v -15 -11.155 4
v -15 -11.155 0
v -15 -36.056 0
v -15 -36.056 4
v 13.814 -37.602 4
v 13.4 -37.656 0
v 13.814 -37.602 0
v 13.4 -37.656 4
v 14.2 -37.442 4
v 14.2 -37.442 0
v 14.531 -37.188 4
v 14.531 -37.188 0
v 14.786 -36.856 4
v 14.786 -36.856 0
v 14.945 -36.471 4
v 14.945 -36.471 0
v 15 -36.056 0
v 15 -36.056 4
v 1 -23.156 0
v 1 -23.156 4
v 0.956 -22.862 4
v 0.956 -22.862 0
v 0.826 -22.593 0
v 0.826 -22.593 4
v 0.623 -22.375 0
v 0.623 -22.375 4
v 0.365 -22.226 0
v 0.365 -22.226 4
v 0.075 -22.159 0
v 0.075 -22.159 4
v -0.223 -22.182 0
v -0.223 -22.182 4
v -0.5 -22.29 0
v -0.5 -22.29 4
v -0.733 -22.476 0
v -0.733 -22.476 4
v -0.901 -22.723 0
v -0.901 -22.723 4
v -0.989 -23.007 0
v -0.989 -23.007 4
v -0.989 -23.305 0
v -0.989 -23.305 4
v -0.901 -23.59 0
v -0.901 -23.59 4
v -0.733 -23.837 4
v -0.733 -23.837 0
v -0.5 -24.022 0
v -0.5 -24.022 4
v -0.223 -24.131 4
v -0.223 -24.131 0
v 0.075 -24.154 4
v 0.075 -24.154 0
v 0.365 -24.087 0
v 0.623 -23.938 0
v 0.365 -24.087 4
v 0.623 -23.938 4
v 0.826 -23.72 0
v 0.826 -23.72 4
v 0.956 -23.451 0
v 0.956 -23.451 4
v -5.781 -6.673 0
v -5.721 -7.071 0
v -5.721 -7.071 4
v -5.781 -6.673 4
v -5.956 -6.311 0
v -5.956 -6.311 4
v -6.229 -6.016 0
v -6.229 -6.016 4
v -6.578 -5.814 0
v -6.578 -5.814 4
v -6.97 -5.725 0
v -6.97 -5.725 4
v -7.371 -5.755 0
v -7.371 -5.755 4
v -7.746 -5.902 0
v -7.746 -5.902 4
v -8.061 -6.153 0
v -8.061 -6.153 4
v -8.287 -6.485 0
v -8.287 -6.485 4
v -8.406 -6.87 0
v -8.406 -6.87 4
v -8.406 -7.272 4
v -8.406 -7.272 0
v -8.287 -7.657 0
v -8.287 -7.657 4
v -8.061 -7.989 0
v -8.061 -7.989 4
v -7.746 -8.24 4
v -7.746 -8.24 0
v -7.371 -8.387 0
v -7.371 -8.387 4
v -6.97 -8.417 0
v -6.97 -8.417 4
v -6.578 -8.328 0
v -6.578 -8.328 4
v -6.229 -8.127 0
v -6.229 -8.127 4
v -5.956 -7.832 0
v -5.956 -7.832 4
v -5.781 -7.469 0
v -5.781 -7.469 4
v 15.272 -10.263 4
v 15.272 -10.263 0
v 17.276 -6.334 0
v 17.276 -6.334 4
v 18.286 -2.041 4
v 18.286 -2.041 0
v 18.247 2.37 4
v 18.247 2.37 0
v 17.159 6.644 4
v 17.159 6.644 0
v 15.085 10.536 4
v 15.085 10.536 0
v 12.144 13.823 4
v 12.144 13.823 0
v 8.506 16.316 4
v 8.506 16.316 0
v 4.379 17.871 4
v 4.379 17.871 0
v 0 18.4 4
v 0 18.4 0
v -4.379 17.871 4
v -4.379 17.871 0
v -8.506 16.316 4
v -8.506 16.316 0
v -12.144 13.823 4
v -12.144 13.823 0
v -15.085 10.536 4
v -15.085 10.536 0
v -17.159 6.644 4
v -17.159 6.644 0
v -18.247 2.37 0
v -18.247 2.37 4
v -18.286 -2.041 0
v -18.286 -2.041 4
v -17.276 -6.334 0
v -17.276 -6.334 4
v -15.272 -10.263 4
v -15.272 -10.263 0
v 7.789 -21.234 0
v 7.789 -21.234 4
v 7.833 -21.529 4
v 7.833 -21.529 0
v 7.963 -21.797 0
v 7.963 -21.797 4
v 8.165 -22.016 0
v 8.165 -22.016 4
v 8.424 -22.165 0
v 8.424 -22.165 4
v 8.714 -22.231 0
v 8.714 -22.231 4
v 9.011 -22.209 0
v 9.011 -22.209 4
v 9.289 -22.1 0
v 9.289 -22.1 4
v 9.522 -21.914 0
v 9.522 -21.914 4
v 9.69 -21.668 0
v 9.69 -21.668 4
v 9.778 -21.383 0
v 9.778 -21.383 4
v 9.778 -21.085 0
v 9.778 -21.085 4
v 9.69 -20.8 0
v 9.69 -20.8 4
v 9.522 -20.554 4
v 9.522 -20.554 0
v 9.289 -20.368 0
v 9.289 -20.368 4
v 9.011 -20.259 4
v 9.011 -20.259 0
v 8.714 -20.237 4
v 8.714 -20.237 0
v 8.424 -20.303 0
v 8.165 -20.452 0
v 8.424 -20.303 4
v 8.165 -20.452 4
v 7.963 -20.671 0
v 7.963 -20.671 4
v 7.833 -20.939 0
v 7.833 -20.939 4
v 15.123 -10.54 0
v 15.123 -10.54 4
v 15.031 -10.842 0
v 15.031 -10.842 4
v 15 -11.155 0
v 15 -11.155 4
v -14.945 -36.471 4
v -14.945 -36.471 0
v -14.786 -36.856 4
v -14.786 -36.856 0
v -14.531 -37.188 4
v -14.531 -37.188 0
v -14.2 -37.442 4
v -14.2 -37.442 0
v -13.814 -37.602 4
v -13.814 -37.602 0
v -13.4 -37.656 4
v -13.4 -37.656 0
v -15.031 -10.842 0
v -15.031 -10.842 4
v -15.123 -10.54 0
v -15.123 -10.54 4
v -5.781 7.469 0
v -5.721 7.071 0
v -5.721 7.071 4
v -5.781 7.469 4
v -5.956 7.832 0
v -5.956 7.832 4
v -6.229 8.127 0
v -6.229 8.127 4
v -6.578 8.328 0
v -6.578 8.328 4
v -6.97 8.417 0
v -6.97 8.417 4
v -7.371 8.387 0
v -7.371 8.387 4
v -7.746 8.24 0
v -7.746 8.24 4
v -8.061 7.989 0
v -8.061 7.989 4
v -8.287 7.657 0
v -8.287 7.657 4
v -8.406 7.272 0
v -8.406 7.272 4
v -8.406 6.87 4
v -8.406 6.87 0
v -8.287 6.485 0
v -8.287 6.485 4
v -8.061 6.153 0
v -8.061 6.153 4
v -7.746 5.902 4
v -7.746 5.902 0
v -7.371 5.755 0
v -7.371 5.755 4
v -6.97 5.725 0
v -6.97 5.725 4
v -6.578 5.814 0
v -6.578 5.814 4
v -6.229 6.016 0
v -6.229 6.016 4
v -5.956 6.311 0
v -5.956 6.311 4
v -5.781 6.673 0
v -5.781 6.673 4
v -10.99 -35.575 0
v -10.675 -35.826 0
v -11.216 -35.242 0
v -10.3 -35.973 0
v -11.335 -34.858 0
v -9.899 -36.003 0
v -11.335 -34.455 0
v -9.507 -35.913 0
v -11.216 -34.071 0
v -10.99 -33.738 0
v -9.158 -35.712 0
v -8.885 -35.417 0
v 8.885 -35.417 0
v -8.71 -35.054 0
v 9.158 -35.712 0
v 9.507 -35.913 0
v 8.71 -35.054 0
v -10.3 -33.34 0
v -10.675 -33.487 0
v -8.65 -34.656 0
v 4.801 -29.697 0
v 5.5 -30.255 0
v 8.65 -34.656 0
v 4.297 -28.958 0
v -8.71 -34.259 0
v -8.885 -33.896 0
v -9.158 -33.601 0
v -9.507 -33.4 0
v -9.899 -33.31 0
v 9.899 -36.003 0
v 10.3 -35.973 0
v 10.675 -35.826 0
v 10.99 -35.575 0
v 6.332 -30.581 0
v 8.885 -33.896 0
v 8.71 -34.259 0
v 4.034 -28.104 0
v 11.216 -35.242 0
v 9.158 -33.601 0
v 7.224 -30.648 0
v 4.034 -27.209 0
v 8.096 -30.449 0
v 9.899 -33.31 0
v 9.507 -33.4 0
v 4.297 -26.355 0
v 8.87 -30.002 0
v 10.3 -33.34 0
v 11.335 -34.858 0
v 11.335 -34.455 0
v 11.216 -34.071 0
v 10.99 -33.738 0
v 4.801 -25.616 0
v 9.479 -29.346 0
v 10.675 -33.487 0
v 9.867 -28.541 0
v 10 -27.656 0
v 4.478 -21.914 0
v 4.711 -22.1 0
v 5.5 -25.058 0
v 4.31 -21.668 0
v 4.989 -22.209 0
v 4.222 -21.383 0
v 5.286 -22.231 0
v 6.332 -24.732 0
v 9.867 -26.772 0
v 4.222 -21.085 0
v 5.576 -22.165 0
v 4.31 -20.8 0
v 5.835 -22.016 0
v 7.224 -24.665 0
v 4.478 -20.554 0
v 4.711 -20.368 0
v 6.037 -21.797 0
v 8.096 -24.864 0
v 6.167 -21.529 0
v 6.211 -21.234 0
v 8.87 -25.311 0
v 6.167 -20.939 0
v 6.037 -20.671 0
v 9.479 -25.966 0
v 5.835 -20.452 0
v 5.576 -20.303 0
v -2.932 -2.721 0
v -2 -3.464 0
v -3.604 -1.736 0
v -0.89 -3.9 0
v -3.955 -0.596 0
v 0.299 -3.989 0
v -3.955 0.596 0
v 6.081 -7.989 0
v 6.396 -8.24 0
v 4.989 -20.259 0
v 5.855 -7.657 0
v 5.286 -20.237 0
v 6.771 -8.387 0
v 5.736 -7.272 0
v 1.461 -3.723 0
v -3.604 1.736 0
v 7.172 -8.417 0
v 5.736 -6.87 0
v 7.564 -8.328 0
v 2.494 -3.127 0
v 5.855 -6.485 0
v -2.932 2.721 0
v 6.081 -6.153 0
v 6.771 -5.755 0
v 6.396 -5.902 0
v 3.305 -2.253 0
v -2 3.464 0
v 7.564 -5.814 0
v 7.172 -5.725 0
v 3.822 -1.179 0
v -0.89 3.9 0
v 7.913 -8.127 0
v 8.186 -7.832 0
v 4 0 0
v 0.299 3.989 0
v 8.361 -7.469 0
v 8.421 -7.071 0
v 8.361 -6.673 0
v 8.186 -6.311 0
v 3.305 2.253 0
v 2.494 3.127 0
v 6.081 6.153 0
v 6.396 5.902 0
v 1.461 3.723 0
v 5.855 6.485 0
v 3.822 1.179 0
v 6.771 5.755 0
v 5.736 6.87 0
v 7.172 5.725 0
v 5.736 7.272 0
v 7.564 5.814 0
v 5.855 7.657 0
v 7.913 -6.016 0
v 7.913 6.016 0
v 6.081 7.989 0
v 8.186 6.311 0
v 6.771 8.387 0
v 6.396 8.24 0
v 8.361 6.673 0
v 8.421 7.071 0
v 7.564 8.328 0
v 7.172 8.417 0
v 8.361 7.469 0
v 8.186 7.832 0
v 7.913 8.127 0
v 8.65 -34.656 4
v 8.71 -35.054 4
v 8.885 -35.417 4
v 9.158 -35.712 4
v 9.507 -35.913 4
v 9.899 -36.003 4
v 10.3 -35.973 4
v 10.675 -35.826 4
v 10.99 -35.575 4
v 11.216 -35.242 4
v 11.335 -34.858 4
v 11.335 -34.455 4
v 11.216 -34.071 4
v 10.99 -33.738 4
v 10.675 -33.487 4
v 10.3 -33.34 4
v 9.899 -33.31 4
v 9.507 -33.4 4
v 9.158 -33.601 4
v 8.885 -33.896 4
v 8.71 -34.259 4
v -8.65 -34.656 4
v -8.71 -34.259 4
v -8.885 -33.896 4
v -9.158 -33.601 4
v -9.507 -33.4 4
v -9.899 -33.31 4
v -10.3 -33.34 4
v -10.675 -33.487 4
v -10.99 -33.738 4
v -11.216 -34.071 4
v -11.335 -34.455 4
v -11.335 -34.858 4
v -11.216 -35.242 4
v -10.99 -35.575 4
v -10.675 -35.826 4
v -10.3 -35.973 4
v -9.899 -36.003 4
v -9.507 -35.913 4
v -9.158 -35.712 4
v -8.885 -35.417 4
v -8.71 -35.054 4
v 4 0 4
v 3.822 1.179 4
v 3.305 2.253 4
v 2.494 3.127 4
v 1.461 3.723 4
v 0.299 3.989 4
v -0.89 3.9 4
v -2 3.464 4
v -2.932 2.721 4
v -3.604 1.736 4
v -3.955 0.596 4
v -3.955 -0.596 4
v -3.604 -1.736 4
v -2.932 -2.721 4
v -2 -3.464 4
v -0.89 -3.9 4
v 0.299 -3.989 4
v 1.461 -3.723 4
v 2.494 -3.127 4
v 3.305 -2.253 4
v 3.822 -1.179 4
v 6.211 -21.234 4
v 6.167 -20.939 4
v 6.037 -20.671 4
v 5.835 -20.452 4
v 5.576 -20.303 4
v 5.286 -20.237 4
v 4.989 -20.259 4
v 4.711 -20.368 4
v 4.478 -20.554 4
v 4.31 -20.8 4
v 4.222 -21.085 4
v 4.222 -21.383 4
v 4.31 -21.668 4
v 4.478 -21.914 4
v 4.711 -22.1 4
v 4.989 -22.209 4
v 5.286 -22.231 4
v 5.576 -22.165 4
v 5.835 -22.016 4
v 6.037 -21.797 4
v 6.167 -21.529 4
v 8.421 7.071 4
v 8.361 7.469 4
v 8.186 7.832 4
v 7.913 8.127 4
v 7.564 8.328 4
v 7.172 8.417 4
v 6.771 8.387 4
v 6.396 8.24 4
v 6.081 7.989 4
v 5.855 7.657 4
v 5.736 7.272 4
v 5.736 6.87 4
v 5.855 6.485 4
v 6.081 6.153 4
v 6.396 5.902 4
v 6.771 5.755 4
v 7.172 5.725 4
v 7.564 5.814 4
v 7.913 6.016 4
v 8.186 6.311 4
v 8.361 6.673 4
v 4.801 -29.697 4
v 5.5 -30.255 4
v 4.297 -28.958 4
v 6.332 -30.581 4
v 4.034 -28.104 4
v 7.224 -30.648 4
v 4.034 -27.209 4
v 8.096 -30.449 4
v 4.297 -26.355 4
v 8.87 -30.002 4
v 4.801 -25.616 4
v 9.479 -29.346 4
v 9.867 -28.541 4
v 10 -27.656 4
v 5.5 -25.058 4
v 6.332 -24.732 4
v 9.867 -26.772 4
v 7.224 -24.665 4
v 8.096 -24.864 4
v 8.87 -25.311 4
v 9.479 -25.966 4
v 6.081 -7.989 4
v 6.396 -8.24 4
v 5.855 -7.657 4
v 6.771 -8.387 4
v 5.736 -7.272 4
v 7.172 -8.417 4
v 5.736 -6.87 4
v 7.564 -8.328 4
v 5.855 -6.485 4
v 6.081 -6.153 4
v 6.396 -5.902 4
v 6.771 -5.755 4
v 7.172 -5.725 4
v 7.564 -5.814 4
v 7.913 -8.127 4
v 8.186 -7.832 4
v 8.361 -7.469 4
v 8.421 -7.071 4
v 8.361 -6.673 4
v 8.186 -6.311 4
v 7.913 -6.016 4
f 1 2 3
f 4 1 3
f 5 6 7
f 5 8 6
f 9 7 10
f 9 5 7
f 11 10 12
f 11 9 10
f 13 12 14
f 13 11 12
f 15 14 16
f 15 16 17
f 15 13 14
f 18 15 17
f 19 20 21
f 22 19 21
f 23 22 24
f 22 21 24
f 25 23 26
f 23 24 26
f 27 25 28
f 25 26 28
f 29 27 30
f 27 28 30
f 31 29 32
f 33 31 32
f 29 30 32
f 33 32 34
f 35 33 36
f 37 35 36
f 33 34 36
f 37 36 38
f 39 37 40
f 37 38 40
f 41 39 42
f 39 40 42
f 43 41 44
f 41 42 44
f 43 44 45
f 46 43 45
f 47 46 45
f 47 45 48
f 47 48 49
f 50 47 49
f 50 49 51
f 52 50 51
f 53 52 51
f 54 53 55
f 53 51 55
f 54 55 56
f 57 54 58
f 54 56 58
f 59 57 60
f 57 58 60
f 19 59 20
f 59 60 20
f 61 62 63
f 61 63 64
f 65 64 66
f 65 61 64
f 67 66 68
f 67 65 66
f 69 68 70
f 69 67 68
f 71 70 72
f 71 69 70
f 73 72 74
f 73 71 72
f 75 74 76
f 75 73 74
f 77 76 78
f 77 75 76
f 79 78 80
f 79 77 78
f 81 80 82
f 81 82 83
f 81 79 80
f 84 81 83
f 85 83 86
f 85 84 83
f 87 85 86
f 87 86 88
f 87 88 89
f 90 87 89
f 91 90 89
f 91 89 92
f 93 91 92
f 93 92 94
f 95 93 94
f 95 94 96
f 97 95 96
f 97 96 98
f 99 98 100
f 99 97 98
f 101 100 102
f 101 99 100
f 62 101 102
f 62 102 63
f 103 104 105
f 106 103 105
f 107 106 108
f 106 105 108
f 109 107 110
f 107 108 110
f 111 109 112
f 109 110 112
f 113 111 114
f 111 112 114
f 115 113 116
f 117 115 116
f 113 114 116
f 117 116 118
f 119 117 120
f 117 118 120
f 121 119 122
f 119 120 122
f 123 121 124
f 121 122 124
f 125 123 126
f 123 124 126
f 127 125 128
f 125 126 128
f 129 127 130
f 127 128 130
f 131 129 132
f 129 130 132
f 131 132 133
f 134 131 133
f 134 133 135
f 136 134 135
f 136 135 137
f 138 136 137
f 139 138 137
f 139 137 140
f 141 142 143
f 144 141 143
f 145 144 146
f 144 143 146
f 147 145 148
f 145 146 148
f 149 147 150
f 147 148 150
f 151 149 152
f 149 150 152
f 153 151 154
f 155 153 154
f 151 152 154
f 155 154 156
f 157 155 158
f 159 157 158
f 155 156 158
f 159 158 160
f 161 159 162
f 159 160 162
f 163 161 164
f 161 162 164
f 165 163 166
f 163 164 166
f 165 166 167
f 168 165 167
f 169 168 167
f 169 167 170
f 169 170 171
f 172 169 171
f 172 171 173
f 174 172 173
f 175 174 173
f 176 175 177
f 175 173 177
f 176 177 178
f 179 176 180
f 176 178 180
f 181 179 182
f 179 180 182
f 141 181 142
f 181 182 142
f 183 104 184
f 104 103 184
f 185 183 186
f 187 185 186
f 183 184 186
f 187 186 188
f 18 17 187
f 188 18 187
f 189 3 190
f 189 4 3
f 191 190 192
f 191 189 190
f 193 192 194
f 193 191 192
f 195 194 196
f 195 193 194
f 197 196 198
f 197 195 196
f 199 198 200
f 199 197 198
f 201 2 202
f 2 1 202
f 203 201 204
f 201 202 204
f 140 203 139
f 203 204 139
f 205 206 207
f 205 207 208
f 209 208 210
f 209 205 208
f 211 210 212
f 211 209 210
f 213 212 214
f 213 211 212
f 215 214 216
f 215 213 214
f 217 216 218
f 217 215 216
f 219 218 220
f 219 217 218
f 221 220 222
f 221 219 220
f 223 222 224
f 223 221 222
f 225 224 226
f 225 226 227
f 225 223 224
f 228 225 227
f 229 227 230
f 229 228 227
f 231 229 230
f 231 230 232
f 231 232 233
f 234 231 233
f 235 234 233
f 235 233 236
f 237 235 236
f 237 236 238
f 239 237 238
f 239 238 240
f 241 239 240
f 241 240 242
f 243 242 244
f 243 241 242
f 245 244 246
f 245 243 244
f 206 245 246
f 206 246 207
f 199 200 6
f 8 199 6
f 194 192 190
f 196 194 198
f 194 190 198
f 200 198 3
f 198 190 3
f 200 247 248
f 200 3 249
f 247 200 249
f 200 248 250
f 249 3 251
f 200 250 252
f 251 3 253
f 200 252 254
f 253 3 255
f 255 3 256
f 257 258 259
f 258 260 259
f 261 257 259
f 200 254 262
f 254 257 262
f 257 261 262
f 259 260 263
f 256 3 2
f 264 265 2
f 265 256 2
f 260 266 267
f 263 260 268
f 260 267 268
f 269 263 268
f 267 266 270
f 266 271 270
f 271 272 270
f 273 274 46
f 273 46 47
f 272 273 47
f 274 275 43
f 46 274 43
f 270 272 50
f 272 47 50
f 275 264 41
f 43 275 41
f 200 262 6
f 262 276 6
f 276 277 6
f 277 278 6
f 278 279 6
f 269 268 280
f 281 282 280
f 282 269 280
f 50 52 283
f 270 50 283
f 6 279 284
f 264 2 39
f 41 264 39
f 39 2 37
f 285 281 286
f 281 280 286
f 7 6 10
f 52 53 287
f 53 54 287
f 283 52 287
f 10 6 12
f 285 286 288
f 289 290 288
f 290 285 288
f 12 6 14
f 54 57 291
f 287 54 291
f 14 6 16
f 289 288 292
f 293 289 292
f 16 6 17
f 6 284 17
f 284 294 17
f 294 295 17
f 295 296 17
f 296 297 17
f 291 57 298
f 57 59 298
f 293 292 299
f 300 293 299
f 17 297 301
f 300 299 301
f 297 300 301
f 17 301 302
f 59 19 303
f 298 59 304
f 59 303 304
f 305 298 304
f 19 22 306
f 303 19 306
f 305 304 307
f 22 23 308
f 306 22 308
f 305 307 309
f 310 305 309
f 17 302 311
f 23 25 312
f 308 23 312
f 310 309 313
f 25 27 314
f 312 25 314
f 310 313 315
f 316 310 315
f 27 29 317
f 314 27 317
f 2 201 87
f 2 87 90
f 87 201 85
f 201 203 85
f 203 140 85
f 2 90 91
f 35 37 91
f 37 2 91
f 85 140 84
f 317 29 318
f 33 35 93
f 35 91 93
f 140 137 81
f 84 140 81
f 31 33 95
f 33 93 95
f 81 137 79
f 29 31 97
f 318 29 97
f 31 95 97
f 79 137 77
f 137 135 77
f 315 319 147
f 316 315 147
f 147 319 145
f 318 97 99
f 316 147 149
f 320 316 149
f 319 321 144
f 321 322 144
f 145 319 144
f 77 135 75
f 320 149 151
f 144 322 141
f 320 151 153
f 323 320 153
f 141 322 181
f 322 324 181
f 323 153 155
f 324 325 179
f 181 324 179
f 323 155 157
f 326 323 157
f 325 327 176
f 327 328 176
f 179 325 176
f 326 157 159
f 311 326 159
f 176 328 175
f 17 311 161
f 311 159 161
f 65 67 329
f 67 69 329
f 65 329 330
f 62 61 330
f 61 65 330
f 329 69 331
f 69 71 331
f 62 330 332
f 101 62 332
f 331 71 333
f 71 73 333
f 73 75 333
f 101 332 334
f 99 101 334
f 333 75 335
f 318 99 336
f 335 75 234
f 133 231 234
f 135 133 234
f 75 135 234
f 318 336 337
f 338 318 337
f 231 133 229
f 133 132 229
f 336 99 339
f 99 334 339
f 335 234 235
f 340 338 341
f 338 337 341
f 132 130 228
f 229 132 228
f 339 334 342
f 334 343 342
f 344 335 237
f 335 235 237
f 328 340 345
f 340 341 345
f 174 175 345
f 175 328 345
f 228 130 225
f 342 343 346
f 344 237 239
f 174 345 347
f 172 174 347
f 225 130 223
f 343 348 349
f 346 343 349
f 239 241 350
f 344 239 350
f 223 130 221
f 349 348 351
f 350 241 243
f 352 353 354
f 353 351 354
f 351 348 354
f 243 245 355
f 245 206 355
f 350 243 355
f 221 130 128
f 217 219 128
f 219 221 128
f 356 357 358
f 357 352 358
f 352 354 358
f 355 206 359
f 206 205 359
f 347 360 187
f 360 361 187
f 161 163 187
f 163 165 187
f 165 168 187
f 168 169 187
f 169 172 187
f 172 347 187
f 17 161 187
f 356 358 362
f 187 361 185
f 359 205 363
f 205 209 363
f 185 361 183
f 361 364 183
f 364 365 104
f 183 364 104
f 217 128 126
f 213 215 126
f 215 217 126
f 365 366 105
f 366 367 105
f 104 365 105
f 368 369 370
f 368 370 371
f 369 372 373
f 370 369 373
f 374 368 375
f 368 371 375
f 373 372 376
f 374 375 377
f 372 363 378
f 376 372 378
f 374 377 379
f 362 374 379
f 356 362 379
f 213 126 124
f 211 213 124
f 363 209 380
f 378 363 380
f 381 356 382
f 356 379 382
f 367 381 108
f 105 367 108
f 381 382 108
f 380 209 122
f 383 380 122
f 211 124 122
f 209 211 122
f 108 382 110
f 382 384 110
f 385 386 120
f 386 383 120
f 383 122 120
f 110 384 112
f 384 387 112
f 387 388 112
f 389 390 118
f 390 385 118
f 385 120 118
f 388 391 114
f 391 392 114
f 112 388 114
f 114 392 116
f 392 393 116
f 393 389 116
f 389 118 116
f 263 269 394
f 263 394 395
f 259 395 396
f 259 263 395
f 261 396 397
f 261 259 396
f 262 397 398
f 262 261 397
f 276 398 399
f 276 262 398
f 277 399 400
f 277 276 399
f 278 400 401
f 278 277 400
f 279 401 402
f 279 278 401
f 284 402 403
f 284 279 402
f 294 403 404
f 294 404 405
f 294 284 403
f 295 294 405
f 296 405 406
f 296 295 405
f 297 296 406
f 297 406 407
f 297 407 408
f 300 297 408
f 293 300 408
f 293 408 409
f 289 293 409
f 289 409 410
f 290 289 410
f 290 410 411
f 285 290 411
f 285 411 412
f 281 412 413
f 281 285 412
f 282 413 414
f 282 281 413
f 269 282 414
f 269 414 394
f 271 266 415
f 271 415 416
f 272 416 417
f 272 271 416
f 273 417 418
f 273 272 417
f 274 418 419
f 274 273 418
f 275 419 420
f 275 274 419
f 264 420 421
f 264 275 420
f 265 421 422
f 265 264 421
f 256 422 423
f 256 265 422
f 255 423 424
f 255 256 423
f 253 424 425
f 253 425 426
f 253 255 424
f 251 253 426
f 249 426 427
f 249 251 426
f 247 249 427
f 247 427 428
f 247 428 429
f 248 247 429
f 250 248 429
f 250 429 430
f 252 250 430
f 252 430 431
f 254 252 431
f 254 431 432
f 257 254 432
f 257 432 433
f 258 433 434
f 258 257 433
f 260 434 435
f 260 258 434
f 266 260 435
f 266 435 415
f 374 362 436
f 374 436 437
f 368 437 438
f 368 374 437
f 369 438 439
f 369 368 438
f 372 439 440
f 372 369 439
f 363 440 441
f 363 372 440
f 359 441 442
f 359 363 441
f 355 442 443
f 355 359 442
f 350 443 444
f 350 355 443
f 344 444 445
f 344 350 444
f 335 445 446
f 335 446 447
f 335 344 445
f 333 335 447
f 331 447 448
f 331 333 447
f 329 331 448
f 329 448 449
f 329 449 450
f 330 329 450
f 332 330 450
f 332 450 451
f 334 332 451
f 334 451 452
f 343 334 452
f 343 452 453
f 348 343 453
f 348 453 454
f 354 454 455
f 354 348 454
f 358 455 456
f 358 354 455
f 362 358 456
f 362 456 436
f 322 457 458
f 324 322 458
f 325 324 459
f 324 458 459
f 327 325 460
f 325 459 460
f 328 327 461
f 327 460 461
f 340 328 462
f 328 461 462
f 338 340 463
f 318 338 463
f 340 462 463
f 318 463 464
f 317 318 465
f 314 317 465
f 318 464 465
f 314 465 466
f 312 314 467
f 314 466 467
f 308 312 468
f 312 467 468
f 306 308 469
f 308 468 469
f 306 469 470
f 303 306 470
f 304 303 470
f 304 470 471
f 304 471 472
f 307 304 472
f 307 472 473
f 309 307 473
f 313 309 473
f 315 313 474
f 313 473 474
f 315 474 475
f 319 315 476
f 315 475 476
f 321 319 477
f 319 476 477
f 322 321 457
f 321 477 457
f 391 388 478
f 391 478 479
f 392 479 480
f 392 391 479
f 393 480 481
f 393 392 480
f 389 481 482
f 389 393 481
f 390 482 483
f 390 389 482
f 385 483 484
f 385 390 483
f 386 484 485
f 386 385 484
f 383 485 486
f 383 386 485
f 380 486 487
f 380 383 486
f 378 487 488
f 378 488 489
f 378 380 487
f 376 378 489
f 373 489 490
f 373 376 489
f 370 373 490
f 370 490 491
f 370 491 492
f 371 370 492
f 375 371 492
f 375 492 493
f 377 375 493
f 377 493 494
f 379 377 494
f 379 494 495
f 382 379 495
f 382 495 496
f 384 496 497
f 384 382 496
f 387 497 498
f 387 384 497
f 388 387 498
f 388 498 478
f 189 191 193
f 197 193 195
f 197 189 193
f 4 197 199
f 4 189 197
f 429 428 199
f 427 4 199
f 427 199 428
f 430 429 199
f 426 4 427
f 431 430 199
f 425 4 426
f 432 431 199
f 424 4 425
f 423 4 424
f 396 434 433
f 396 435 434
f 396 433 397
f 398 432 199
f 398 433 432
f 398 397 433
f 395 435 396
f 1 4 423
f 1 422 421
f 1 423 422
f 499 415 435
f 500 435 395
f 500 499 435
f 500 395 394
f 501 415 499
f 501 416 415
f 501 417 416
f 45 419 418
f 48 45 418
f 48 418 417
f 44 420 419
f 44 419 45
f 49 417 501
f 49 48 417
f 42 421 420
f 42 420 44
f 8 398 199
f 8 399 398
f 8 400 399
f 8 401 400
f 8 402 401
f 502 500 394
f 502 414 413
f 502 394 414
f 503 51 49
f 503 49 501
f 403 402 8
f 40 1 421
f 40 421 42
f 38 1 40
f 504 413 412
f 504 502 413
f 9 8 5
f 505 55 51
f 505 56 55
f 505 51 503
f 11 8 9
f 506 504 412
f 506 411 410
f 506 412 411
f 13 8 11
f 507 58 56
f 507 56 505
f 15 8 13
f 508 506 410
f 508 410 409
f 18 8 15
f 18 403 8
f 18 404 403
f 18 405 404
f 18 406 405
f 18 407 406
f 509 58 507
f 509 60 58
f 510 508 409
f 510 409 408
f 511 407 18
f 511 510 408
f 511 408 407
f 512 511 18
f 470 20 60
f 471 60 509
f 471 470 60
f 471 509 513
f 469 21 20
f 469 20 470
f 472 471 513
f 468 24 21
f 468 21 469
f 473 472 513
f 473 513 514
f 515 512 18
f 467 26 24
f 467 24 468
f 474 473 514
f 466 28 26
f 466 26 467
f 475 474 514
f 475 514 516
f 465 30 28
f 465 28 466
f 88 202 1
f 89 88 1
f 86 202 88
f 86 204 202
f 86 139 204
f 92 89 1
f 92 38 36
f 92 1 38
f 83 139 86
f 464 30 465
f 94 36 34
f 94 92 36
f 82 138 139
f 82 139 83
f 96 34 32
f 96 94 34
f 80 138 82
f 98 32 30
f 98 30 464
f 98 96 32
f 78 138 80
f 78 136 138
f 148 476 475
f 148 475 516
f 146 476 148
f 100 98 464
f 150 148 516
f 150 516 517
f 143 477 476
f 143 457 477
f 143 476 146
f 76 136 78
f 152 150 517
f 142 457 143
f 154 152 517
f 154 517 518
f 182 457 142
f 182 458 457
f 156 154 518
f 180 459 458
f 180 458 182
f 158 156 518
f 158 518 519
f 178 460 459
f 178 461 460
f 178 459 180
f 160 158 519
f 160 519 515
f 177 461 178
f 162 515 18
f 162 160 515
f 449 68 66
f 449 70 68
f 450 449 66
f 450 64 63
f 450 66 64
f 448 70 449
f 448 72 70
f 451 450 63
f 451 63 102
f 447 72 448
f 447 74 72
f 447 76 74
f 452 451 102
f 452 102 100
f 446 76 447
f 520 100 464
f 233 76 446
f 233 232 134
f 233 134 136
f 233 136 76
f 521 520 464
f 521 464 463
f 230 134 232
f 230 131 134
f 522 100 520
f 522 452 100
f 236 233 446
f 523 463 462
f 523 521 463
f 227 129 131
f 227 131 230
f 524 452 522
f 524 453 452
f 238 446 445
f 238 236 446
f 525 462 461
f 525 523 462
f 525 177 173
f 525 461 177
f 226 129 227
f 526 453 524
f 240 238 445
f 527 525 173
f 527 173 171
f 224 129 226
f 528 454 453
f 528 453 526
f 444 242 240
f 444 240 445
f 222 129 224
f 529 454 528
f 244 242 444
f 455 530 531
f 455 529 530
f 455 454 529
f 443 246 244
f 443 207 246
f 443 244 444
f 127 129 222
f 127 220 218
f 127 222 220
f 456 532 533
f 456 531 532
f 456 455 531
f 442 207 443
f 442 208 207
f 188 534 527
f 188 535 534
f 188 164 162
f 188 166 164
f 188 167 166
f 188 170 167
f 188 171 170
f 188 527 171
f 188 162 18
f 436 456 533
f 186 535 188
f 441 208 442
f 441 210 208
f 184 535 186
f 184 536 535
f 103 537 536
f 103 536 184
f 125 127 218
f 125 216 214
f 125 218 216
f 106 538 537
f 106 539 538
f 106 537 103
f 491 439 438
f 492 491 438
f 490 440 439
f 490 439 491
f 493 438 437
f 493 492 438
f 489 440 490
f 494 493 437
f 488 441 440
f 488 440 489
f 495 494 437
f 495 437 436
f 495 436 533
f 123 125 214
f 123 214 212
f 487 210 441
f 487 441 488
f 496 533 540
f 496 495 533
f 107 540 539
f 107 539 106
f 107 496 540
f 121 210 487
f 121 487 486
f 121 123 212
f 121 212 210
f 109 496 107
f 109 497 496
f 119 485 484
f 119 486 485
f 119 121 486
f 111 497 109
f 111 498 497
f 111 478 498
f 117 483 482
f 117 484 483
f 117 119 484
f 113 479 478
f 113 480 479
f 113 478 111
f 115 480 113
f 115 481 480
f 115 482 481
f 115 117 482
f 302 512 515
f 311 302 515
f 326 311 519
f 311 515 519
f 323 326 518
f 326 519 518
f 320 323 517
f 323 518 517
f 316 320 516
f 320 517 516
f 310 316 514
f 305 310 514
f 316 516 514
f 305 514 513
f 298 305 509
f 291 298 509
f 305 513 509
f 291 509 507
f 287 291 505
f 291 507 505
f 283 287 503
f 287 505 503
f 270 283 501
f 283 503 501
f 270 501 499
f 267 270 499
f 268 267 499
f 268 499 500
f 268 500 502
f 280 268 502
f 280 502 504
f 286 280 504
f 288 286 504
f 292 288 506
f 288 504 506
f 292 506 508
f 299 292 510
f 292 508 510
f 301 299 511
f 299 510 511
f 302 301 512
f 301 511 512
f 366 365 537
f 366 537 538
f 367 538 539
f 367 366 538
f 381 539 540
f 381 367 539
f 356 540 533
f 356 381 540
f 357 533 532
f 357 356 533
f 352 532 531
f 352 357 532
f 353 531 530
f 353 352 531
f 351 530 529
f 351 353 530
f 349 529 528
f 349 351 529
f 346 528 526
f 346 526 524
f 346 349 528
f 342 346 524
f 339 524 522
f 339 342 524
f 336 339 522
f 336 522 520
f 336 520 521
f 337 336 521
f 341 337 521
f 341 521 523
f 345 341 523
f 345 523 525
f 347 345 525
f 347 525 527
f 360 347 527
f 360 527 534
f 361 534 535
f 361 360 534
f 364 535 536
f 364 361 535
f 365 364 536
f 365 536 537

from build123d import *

# Parameters (mm, degrees)
CROQUIS1_R              = 1.35
CROQUIS1_R_2            = 4
SALIENTE_EXTRUIR1_DEPTH = 4
CROQUIS2_R              = 3
CROQUIS2_R_2            = 1
CORTAR_EXTRUIR1_DEPTH   = 4
REDONDEO1_R             = 1.6
CROQUIS3_R              = 1
CORTAR_EXTRUIR2_DEPTH   = 4


with BuildPart() as part:
    # Croquis1 → Saliente-Extruir1 (new body)
    with BuildSketch(Plane.XY):
        with BuildLine():
            Line((-15, -10.656453444), (-15, -37.656453444))
            Line((-15, -37.656453444), (15, -37.656453444))
            Line((15, -37.656453444), (15, -10.656453444))
            ThreePointArc((15, -10.656453444), (0, 18.4), (-15, -10.656453444))
        make_face()
        with Locations((-7.071067812, -7.071067812)):
            Circle(CROQUIS1_R, mode=Mode.SUBTRACT)
        with Locations((-7.071067812, 7.071067812)):
            Circle(CROQUIS1_R, mode=Mode.SUBTRACT)
        with Locations((7.071067812, 7.071067812)):
            Circle(CROQUIS1_R, mode=Mode.SUBTRACT)
        with Locations((7.071067812, -7.071067812)):
            Circle(CROQUIS1_R, mode=Mode.SUBTRACT)
        Circle(CROQUIS1_R_2, mode=Mode.SUBTRACT)
        with Locations((-10, -34.656453444)):
            Circle(CROQUIS1_R, mode=Mode.SUBTRACT)
        with Locations(Location((10, -34.656453444, 0), (0, 0, 180))):
            Circle(CROQUIS1_R, mode=Mode.SUBTRACT)
    extrude(amount=SALIENTE_EXTRUIR1_DEPTH)

    # Croquis2 → Cortar-Extruir1 (cut)
    with BuildSketch(Plane.XY.offset(4)):
        with Locations((7, -27.656453444)):
            Circle(CROQUIS2_R)
        with Locations((5.211145618, -21.234162208)):
            Circle(CROQUIS2_R_2)
        with Locations(Location((8.788854382, -21.234162208, 0), (0, 0, 180))):
            Circle(CROQUIS2_R_2)
    extrude(amount=-CORTAR_EXTRUIR1_DEPTH, mode=Mode.SUBTRACT)

    # Redondeo1
    redondeo1_edges = [part.edges().sort_by_distance(p)[0] for p in [
        (15, -10.656453444, 2),
        (15, -37.656453444, 2),
        (-15, -37.656453444, 2),
        (-15, -10.656453444, 2),
    ]]
    fillet(redondeo1_edges, radius=REDONDEO1_R)

    # Croquis3 → Cortar-Extruir2 (cut)
    with BuildSketch(Plane.XY.offset(4)):
        with Locations((0, -23.156453444)):
            Circle(CROQUIS3_R)
    extrude(amount=-CORTAR_EXTRUIR2_DEPTH, mode=Mode.SUBTRACT)


solid = part.part
